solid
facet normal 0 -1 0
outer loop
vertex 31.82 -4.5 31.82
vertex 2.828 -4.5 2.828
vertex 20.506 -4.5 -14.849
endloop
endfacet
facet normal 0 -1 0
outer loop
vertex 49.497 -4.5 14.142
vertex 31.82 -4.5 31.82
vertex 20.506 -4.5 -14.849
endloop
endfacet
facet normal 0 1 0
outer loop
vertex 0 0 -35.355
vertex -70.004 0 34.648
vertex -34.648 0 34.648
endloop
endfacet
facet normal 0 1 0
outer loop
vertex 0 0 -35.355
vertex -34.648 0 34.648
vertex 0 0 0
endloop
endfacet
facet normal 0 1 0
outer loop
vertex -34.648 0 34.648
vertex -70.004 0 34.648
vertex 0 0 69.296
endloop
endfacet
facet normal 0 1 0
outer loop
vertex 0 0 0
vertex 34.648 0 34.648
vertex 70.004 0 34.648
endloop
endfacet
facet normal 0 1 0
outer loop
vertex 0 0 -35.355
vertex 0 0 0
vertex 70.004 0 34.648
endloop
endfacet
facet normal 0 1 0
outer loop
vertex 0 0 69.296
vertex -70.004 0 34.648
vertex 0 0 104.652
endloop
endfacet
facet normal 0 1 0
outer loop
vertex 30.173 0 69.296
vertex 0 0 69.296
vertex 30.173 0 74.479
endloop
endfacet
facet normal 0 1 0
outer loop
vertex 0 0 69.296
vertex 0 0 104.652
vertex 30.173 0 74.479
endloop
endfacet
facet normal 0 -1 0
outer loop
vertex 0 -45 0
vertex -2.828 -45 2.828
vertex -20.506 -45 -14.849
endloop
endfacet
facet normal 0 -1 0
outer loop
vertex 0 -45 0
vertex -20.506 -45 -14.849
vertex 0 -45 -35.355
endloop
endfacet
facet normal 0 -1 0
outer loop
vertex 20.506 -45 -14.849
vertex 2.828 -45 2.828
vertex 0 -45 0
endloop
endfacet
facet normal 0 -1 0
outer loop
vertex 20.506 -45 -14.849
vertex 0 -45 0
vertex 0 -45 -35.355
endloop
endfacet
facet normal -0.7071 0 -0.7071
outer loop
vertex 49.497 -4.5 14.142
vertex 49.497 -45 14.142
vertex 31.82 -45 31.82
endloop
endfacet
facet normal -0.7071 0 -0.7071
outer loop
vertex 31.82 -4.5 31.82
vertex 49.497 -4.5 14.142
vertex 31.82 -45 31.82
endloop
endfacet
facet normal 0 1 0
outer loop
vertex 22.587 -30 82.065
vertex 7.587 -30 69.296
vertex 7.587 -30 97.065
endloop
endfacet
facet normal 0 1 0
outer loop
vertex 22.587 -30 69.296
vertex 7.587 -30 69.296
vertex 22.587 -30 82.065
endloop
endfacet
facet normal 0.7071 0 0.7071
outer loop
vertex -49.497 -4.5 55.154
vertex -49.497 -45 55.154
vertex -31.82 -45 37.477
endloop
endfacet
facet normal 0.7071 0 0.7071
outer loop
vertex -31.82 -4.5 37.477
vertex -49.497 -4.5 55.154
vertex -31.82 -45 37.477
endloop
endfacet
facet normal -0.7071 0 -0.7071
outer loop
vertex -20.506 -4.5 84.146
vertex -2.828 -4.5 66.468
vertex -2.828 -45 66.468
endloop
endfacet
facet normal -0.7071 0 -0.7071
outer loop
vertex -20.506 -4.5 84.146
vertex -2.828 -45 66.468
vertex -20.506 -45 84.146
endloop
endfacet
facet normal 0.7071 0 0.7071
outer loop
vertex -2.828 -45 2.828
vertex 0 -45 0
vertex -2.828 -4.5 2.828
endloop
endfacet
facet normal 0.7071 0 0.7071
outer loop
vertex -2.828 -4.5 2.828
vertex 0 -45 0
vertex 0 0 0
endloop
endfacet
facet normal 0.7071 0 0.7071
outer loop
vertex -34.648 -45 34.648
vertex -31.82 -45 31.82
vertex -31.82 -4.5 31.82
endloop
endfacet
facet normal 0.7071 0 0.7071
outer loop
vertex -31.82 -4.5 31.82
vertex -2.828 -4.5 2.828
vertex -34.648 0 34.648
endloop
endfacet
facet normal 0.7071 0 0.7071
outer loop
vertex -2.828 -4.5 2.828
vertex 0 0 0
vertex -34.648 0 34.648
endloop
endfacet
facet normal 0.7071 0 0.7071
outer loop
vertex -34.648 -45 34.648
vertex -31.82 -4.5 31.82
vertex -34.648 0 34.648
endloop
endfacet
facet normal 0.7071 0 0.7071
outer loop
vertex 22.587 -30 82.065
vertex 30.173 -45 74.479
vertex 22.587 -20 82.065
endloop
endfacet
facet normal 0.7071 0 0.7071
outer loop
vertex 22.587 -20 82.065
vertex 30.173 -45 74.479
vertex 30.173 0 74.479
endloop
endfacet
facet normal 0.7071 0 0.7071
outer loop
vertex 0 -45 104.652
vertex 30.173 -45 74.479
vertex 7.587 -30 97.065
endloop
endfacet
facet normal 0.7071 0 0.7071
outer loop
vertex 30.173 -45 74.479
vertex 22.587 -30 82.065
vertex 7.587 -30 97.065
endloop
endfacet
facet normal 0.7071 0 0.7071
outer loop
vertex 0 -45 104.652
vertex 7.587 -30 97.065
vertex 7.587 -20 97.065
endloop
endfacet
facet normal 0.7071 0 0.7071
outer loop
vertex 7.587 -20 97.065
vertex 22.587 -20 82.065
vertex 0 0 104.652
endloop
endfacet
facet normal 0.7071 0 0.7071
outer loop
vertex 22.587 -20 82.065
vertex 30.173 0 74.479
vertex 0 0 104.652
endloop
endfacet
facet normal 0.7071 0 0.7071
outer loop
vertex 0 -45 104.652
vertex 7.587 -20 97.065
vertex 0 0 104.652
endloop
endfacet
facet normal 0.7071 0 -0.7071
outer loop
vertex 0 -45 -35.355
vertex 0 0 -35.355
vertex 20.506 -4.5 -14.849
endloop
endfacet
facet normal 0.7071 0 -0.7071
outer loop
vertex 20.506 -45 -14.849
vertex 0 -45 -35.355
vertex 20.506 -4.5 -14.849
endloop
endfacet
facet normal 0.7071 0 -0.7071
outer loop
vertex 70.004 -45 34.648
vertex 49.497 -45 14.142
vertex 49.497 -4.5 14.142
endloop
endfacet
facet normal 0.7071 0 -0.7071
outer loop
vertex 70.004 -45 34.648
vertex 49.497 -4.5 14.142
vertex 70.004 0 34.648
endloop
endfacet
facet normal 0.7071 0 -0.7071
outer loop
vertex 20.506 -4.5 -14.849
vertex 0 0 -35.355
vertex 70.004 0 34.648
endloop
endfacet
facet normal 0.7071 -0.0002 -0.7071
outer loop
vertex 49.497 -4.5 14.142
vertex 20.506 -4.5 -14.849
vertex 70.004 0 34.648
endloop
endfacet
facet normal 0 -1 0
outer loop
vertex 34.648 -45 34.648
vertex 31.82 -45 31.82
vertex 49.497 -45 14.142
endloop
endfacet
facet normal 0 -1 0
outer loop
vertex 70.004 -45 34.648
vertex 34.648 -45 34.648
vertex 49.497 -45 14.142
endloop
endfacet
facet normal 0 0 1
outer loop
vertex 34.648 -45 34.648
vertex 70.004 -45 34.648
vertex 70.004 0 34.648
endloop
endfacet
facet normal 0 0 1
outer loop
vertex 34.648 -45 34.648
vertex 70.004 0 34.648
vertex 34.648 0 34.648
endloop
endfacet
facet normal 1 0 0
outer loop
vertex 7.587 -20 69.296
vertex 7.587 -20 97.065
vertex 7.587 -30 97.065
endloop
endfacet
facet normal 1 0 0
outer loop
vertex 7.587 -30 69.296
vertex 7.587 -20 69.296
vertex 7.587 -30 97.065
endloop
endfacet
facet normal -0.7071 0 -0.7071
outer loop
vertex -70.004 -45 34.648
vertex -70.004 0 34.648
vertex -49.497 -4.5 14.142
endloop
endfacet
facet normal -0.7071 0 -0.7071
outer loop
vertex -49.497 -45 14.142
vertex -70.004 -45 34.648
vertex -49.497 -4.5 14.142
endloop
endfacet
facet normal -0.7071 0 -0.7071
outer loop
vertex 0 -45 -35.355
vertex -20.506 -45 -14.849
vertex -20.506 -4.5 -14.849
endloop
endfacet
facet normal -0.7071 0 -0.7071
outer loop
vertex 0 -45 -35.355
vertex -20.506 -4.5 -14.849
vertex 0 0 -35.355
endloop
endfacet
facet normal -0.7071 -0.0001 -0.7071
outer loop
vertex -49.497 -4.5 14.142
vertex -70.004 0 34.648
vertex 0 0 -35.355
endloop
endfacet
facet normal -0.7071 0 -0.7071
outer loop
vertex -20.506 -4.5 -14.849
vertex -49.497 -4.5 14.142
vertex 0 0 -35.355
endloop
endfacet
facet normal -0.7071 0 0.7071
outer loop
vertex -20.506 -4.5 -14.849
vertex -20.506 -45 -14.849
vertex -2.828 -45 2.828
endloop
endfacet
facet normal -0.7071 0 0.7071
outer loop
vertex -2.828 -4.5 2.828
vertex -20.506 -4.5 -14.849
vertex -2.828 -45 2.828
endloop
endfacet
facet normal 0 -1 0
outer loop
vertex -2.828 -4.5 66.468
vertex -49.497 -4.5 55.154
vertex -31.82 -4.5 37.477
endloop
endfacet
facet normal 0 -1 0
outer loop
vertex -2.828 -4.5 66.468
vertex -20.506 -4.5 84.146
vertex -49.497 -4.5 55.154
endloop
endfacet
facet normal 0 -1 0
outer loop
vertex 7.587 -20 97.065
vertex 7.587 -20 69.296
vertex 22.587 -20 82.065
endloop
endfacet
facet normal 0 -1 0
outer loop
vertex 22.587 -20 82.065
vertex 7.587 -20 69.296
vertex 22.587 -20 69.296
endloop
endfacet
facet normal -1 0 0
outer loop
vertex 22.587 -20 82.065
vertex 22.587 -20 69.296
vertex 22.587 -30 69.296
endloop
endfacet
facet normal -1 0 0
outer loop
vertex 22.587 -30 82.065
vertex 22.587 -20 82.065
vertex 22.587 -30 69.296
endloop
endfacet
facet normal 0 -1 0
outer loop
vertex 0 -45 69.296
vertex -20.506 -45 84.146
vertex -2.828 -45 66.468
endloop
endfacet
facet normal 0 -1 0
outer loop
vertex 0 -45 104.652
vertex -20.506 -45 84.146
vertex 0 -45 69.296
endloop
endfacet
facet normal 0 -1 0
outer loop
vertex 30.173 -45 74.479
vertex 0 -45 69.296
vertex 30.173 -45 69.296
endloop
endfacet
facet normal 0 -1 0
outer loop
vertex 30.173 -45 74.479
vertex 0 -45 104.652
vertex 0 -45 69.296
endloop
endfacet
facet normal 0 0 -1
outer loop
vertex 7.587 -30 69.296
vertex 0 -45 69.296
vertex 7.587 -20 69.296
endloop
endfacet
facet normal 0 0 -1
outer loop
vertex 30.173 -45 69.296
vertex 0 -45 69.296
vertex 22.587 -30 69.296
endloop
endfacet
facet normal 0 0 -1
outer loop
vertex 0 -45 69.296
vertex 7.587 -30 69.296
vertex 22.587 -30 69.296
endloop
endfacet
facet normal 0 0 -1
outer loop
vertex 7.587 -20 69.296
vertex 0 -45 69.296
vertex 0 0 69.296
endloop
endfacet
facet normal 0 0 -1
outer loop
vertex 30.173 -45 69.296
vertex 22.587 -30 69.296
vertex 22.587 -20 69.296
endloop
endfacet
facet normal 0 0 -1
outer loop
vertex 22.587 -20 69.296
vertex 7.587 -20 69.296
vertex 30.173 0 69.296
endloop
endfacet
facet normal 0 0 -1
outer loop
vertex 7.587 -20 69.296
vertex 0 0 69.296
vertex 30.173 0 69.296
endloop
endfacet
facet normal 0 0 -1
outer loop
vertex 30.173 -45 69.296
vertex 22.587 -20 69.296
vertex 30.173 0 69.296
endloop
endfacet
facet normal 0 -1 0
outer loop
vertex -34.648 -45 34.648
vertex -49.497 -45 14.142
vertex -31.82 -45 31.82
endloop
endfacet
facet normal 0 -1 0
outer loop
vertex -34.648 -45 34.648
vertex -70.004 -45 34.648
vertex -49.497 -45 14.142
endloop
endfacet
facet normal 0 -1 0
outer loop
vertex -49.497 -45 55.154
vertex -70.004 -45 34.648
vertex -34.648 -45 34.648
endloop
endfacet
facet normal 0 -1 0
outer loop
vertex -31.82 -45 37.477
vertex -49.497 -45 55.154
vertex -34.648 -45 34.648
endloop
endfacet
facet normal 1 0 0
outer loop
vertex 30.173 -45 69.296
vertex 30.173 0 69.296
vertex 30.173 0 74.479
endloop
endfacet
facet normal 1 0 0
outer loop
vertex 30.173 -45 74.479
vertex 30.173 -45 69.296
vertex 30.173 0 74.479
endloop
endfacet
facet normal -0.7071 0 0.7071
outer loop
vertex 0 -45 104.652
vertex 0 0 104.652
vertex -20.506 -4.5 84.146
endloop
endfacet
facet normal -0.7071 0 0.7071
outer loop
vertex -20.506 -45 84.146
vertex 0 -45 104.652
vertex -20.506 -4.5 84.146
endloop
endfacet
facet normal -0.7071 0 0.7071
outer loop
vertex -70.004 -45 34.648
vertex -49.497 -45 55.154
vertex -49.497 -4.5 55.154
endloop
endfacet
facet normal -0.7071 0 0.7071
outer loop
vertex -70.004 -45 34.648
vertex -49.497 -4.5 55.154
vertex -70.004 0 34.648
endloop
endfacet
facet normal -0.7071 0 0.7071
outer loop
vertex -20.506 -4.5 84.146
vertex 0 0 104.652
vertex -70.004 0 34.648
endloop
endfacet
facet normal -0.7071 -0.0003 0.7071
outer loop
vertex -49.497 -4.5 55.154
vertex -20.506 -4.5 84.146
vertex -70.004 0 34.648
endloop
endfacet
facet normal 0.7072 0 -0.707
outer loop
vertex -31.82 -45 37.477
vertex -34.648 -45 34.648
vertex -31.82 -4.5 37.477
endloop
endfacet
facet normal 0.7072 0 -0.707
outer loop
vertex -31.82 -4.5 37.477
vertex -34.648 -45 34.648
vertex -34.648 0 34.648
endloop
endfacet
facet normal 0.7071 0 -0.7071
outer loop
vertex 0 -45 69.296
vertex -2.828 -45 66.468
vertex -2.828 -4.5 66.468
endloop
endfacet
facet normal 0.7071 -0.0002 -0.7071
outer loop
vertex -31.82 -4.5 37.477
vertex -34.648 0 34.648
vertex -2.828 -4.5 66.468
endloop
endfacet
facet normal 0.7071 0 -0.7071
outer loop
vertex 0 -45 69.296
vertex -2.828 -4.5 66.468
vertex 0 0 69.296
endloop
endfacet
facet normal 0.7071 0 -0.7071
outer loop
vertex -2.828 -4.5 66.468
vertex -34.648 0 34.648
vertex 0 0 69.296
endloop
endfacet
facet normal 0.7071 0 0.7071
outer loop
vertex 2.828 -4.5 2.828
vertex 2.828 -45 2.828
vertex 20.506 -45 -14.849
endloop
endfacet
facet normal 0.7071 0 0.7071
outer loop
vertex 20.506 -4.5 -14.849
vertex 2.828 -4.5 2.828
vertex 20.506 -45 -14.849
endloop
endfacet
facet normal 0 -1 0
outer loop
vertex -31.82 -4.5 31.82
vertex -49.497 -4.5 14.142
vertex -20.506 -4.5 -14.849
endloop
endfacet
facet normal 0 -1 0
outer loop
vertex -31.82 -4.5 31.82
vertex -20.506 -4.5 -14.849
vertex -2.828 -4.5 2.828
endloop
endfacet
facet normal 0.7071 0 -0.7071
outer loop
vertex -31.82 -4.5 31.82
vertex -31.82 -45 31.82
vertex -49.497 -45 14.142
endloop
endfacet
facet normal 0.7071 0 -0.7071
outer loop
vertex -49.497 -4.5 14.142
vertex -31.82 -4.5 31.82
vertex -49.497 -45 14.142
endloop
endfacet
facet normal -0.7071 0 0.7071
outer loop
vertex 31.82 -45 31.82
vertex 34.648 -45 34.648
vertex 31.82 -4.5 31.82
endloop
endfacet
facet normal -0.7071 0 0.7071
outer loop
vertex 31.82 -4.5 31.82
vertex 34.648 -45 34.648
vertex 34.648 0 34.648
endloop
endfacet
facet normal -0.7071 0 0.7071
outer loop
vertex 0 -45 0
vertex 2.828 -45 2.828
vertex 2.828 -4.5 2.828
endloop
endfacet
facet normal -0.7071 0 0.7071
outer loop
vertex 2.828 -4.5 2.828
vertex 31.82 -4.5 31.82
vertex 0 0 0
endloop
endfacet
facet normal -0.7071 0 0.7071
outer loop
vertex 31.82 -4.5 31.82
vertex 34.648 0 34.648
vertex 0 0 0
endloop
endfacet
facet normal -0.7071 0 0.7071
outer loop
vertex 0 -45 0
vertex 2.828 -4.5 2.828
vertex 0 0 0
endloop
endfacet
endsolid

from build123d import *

# Parameters (mm, degrees)
F1_DEPTH = 45
F3_DEPTH = 40.5
F4_W     = 15
F4_H     = 10
F5_DEPTH = 30


with BuildPart() as f1:
    # F0 (on Front) → F1 (new body)
    with BuildSketch(Plane.XZ):
        Polygon((34.648232, 34.648232), (0, 0), (-34.648232, 34.648232), (0, 69.296465), (30.173114, 69.296465), (30.173114, 74.47869), (0, 104.651804), (-70.003571, 34.648232), (0, -35.355339), (70.003571, 34.648232), align=None)
    extrude(amount=F1_DEPTH)

    # F2 (on face) → F3 (cut)
    with BuildSketch(Plane.XZ.offset(45)):
        Polygon((-20.506097, 84.145707), (-49.497475, 55.154329), (-31.819805, 37.476659), (-2.828427, 66.468037), align=None)
        Polygon((-2.828427, 2.828427), (-31.819805, 31.819805), (-49.497475, 14.142136), (-20.506097, -14.849242), align=None)
        Polygon((31.819805, 31.819805), (2.828427, 2.828427), (20.506097, -14.849242), (49.497475, 14.142136), align=None)
    extrude(amount=-F3_DEPTH, mode=Mode.SUBTRACT)

    # F4 (on face) → F5 (cut)
    with BuildSketch(Plane(origin=(0, 0, 69.296465), x_dir=(1, 0, 0), z_dir=(0, 0, -1))):
        with Locations((15.086557, 25)):
            Rectangle(F4_W, F4_H)
    extrude(amount=-F5_DEPTH, mode=Mode.SUBTRACT)


solid = f1.part
